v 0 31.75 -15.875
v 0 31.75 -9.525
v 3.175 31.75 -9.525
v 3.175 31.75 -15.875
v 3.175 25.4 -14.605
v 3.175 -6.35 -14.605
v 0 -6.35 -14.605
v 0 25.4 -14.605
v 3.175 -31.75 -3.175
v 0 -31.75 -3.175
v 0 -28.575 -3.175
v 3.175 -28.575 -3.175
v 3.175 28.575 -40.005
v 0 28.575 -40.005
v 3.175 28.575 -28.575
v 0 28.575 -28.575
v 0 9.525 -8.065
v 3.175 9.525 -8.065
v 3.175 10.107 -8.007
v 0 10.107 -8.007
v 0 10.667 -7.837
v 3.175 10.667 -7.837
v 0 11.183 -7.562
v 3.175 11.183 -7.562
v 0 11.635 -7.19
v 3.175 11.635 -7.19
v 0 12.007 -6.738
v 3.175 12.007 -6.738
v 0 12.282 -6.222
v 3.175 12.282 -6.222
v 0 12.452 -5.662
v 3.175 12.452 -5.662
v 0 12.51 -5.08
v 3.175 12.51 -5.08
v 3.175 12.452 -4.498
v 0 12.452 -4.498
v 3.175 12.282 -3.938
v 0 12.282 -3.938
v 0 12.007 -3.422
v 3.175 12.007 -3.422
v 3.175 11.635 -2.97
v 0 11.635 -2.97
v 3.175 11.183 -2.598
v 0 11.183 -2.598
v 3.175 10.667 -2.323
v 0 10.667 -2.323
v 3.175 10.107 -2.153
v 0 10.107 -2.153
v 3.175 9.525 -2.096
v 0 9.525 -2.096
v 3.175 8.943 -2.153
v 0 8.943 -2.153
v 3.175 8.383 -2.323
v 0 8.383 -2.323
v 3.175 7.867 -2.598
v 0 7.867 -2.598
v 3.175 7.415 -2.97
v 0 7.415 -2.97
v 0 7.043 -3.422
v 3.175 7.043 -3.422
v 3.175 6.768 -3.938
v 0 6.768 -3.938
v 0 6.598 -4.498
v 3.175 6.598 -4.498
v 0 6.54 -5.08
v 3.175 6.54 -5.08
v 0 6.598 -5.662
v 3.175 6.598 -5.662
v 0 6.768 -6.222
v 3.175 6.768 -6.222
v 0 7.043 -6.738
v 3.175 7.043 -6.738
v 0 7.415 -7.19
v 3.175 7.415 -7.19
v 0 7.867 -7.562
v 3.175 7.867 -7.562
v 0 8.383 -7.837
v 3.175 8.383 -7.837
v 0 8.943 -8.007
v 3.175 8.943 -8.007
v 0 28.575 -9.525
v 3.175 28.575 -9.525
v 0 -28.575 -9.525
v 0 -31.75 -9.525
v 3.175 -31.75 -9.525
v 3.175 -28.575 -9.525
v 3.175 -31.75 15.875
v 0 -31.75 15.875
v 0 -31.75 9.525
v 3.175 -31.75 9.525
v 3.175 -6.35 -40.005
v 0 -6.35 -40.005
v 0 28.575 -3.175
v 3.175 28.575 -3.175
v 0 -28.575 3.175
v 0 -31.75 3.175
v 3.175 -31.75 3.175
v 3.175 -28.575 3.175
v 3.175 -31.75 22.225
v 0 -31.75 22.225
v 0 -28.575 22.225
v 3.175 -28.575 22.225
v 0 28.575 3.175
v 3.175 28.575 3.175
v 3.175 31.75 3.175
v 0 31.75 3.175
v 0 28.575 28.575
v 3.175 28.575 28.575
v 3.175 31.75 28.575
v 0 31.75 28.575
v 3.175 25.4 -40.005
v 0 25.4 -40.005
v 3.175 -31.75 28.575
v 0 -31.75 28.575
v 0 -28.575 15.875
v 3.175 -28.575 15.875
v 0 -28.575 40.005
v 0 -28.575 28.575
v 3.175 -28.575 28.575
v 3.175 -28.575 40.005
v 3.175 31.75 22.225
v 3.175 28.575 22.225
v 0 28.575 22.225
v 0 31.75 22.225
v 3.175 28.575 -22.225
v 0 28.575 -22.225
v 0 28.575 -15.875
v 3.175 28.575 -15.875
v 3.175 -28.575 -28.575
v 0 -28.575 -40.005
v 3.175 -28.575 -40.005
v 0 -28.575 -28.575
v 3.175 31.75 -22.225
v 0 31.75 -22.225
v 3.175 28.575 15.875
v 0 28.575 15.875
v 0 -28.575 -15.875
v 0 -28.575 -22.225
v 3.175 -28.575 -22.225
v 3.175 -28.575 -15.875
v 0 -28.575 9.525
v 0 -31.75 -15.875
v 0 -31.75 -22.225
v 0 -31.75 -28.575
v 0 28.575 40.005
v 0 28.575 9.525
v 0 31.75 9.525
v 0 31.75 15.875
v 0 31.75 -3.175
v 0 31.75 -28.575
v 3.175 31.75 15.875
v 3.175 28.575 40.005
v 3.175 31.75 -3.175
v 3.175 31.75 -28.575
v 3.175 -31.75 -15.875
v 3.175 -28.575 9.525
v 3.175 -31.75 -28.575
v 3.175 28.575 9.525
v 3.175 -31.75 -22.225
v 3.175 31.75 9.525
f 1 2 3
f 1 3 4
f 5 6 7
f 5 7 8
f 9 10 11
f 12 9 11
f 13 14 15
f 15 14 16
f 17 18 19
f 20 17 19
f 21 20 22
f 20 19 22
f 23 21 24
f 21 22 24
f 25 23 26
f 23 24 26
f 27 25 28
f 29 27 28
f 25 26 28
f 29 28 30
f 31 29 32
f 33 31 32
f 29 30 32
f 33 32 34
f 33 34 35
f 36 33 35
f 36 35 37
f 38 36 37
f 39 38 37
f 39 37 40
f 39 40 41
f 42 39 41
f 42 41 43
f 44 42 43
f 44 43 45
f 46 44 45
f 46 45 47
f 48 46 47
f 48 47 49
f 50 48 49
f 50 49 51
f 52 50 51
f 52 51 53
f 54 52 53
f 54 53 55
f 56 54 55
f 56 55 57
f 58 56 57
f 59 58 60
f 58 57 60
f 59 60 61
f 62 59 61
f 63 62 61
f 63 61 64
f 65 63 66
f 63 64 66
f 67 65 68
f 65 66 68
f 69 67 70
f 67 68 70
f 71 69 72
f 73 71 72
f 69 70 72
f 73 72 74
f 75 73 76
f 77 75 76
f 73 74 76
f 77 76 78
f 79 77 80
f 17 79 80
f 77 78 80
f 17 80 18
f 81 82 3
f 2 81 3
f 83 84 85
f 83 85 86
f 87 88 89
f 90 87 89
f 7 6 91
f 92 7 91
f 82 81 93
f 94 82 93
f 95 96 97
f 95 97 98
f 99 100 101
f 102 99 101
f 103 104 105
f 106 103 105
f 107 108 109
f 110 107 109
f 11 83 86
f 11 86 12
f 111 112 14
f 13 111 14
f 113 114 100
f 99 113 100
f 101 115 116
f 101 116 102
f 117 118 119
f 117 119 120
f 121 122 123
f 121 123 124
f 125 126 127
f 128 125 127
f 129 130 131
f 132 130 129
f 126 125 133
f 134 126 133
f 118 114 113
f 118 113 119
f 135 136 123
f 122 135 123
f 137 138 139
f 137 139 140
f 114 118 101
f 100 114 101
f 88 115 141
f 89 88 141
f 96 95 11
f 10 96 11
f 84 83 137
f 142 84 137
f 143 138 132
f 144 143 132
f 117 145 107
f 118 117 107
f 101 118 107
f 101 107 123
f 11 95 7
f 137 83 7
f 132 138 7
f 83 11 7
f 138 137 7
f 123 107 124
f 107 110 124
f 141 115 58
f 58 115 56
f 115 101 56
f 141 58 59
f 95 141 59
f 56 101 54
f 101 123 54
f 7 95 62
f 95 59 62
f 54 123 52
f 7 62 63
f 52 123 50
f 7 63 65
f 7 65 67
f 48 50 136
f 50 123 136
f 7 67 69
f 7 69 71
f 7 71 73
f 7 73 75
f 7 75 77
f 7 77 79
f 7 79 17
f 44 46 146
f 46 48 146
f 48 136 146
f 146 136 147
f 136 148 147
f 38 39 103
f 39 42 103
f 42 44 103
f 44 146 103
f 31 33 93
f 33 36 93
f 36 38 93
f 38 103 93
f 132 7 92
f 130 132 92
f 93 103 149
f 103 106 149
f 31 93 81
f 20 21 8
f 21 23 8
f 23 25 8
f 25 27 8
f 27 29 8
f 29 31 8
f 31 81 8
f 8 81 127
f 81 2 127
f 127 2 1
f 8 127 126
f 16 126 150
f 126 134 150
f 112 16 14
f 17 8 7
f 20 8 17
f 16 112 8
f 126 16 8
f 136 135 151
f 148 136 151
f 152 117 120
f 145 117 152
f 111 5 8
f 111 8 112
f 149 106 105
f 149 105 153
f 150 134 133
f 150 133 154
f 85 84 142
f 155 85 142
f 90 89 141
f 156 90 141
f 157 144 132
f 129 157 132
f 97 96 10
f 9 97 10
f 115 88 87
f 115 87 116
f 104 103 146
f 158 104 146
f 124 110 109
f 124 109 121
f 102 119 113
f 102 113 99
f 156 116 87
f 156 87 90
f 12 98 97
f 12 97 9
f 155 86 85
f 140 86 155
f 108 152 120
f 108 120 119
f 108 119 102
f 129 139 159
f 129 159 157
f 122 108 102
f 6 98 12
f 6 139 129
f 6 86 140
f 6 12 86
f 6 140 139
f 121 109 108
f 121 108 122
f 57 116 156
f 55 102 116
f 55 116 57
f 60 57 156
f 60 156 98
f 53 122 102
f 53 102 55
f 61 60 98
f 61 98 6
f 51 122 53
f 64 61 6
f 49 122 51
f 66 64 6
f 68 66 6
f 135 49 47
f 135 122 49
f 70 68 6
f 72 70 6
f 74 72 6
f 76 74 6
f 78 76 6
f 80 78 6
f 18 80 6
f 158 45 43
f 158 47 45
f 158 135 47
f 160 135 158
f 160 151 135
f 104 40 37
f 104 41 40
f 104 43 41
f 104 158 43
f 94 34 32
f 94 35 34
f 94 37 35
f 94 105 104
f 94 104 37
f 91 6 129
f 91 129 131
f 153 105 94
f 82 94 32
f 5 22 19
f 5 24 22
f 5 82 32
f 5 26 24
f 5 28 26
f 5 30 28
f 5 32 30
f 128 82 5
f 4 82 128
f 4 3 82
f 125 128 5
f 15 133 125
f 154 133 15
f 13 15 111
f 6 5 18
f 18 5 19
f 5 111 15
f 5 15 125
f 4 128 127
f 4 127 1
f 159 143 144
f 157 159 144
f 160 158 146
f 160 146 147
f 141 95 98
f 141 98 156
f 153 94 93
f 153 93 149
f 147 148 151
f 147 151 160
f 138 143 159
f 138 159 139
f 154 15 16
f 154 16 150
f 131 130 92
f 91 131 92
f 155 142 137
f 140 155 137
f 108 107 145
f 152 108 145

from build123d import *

# Parameters (mm, degrees)
SKETCH2_W           = 80.01
SKETCH2_H           = 63.5
BOSS_EXTRUDE1_DEPTH = 3.175
SKETCH3_W           = 11.43
SKETCH3_H           = 3.175
SKETCH3_W_2         = 6.35
CUT_EXTRUDE1_DEPTH  = 4.175
SKETCH4_R           = 2.9845
SKETCH4_W           = 25.4
SKETCH4_H           = 31.75
CUT_EXTRUDE2_DEPTH  = 4.175


with BuildPart() as part:
    # Sketch2 → Boss-Extrude1 (new body)
    with BuildSketch(Plane(origin=(0, 0, 0), x_dir=(0, 0, -1), z_dir=(1, 0, 0))):
        Rectangle(SKETCH2_W, SKETCH2_H)
    extrude(amount=BOSS_EXTRUDE1_DEPTH)

    # Sketch3 → Cut-Extrude1 (cut, through all)
    with BuildSketch(Plane.ZY):
        with Locations((-34.29, -30.1625)):
            Rectangle(SKETCH3_W, SKETCH3_H)
        with Locations((-19.05, -30.1625)):
            Rectangle(SKETCH3_W_2, SKETCH3_H)
        with Locations((-6.35, -30.1625)):
            Rectangle(SKETCH3_W_2, SKETCH3_H)
        with Locations((6.35, -30.1625)):
            Rectangle(SKETCH3_W_2, SKETCH3_H)
        with Locations((19.05, -30.1625)):
            Rectangle(SKETCH3_W_2, SKETCH3_H)
        with Locations((34.29, -30.1625)):
            Rectangle(SKETCH3_W, SKETCH3_H)
        with Locations((34.29, 30.1625)):
            Rectangle(SKETCH3_W, SKETCH3_H)
        with Locations((19.05, 30.1625)):
            Rectangle(SKETCH3_W_2, SKETCH3_H)
        with Locations((6.35, 30.1625)):
            Rectangle(SKETCH3_W_2, SKETCH3_H)
        with Locations((-6.35, 30.1625)):
            Rectangle(SKETCH3_W_2, SKETCH3_H)
        with Locations((-19.05, 30.1625)):
            Rectangle(SKETCH3_W_2, SKETCH3_H)
        with Locations((-34.29, 30.1625)):
            Rectangle(SKETCH3_W, SKETCH3_H)
    extrude(amount=-CUT_EXTRUDE1_DEPTH, mode=Mode.SUBTRACT)

    # Sketch4 → Cut-Extrude2 (cut, through all)
    with BuildSketch(Plane(origin=(3.175, 0, 0), x_dir=(0, 0, -1), z_dir=(1, 0, 0))):
        with Locations((5.08, 9.525)):
            Circle(SKETCH4_R)
        with Locations((27.305, 9.525)):
            Rectangle(SKETCH4_W, SKETCH4_H)
    extrude(amount=-CUT_EXTRUDE2_DEPTH, mode=Mode.SUBTRACT)


solid = part.part
